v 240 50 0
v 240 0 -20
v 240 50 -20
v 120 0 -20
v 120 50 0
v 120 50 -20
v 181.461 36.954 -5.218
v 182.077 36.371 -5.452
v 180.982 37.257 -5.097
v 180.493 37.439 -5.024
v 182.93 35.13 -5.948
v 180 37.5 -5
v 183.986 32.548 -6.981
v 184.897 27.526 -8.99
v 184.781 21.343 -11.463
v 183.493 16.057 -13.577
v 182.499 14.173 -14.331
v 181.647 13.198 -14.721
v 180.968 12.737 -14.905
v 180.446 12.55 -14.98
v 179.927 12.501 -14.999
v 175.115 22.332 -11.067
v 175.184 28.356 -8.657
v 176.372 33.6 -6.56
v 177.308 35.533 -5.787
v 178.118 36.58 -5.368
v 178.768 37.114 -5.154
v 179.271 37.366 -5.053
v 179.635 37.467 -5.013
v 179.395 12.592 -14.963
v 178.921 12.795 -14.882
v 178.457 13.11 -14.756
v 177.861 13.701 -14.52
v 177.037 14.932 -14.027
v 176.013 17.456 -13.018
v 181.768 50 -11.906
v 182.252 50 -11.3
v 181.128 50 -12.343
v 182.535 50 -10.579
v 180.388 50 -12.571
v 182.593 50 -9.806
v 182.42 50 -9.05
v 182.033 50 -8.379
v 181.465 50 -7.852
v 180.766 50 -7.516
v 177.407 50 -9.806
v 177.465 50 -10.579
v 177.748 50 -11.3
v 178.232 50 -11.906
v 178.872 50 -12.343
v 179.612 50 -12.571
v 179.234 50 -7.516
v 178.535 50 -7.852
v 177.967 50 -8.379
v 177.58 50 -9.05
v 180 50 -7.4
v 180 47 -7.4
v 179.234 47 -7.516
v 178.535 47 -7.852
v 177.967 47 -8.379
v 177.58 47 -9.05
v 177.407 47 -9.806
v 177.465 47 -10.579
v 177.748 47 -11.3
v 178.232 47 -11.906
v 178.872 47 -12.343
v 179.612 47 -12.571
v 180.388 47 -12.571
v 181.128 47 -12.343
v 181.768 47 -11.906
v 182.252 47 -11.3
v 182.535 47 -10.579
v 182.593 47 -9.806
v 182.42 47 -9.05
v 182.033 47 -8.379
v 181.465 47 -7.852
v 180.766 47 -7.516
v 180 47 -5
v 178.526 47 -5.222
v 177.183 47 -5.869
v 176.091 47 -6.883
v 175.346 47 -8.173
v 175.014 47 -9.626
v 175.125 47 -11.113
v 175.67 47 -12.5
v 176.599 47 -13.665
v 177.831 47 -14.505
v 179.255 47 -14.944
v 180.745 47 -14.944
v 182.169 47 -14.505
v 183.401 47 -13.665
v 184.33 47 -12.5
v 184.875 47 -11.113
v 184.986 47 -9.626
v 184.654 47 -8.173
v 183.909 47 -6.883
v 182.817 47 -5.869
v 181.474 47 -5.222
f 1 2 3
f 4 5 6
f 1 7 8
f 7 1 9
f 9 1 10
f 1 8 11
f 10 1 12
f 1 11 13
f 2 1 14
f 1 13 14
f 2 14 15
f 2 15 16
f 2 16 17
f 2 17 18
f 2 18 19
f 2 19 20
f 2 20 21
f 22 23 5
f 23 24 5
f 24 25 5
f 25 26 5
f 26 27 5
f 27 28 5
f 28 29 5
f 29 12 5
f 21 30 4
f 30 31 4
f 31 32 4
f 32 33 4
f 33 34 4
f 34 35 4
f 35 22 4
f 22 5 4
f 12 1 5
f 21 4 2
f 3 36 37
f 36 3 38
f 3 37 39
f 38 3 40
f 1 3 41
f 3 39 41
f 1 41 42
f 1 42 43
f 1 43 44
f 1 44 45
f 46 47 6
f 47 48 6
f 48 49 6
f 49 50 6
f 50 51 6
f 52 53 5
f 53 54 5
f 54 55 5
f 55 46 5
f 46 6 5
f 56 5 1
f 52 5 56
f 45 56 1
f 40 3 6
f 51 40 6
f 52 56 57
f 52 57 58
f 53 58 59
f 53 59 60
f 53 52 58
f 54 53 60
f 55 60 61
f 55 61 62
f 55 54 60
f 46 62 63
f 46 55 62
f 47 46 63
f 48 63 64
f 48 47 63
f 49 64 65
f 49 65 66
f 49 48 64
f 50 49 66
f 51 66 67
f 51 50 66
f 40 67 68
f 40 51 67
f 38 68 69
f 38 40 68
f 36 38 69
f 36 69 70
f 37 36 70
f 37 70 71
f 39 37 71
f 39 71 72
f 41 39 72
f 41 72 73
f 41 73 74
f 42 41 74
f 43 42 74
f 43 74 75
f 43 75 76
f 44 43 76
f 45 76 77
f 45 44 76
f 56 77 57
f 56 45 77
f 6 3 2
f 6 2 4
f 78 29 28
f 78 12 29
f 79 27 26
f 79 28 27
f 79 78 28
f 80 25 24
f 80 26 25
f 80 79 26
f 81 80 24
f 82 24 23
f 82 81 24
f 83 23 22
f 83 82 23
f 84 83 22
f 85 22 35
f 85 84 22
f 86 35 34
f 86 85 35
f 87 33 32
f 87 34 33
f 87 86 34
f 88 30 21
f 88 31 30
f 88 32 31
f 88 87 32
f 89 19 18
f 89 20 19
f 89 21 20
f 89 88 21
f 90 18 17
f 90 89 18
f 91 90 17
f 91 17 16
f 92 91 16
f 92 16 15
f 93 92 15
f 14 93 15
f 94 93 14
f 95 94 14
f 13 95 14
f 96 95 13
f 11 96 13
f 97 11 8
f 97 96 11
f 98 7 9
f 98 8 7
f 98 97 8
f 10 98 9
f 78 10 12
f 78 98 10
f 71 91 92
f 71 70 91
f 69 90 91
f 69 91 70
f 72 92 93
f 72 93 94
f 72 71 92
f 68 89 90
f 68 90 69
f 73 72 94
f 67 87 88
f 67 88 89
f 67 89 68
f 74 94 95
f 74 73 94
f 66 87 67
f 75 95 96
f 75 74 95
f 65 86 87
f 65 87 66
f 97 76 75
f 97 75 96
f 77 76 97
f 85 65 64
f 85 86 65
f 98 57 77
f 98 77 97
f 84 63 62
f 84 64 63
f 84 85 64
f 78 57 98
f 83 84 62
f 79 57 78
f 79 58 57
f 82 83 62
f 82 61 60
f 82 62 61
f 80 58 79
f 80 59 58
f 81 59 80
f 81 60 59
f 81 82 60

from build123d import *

# Parameters (mm, degrees)
SKETCH_1_W          = 120
SKETCH_1_H          = 20
EXTRUDE_1_DEPTH     = 50
SKETCH_2_W          = 6
SKETCH_2_H          = 20
EXTRUDE_2_DEPTH     = 20
CUT_EXTRUDE_1_DEPTH = 114
SKETCH_4_R          = 2.6
SKETCH_4_W          = 20
SKETCH_4_H          = 20
CUT_EXTRUDE_2_DEPTH = 114
SKETCH_5_R          = 5
CUT_EXTRUDE_3_DEPTH = 3
SKETCH_6_R          = 2.6
CUT_EXTRUDE_4_DEPTH = 300
SKETCH_8_R          = 5
CUT_EXTRUDE_5_DEPTH = 300
SKETCH_9_R          = 5
SKETCH_9_R_2        = 2.6
EXTRUDE_3_DEPTH     = 3
SKETCH_11_W         = 120
SKETCH_11_H         = 20
CUT_EXTRUDE_6_DEPTH = 100
CUT_EXTRUDE_7_DEPTH = 10


with BuildPart() as part:
    # 草图1 → 凸台-拉伸1 (new body)
    with BuildSketch(Plane(origin=(0, 0, 0), x_dir=(1, 0, 0), z_dir=(0, 1, 0))):
        with Locations((60, 10)):
            Rectangle(SKETCH_1_W, SKETCH_1_H)
    extrude_1 = extrude(amount=EXTRUDE_1_DEPTH)

    # 草图2 → 凸台-拉伸2 (add)
    with BuildSketch(Plane.XY):
        with Locations((3, -10)):
            Rectangle(SKETCH_2_W, SKETCH_2_H)
    extrude_2 = extrude(amount=-EXTRUDE_2_DEPTH)

    # 草图3 → 切除-拉伸1 (cut)
    with BuildSketch(Plane(origin=(120, 0, 0), x_dir=(0, 0, -1), z_dir=(1, 0, 0))):
        Polygon((0, 50), (20, 0), (0, 0), align=None)
    cut_extrude_1 = extrude(amount=-CUT_EXTRUDE_1_DEPTH, mode=Mode.SUBTRACT)

    # 草图4 → 切除-拉伸2 (cut)
    with BuildSketch(Plane(origin=(6, 0, 0), x_dir=(0, 0, -1), z_dir=(1, 0, 0))):
        with Locations((10, 10)):
            Circle(SKETCH_4_R)
        with Locations((10, -10)):
            Rectangle(SKETCH_4_W, SKETCH_4_H)
    cut_extrude_2 = extrude(amount=-CUT_EXTRUDE_2_DEPTH, mode=Mode.SUBTRACT)

    # 草图5 → 切除-拉伸3 (cut)
    with BuildSketch(Plane(origin=(6, 0, 0), x_dir=(0, 0, -1), z_dir=(1, 0, 0))):
        with Locations((10, 10)):
            Circle(SKETCH_5_R)
    cut_extrude_3 = extrude(amount=-CUT_EXTRUDE_3_DEPTH, mode=Mode.SUBTRACT)

    # 草图6 → 切除-拉伸4 (cut)
    with BuildSketch(Plane(origin=(0, 50, 0), x_dir=(1, 0, 0), z_dir=(0, 1, 0))):
        with Locations((60, 10)):
            Circle(SKETCH_6_R)
    extrude(amount=-CUT_EXTRUDE_4_DEPTH, mode=Mode.SUBTRACT)

    # 草图8 → 切除-拉伸5 (cut)
    with BuildSketch(Plane(origin=(0, 50, 0), x_dir=(1, 0, 0), z_dir=(0, 1, 0))):
        with Locations((60, 10)):
            Circle(SKETCH_8_R)
    cut_extrude_5 = extrude(amount=-CUT_EXTRUDE_5_DEPTH, mode=Mode.SUBTRACT)

    # 草图9 → 凸台-拉伸3 (add)
    with BuildSketch(Plane(origin=(0, 50, 0), x_dir=(1, 0, 0), z_dir=(0, 1, 0))):
        with Locations((60, 10)):
            Circle(SKETCH_9_R)
        with Locations((60, 10)):
            Circle(SKETCH_9_R_2, mode=Mode.SUBTRACT)
    extrude_3 = extrude(amount=-EXTRUDE_3_DEPTH)

    # 镜向2: 凸台-拉伸1, 凸台-拉伸2, 切除-拉伸1, 切除-拉伸2, 切除-拉伸3, 切除-拉伸5, 凸台-拉伸3 across plane
    add(extrude_1.mirror(Plane(origin=(120, 50, 0), x_dir=(0, 0, 1), z_dir=(-1, 0, 0))))
    add(extrude_2.mirror(Plane(origin=(120, 50, 0), x_dir=(0, 0, 1), z_dir=(-1, 0, 0))))
    add(cut_extrude_1.mirror(Plane(origin=(120, 50, 0), x_dir=(0, 0, 1), z_dir=(-1, 0, 0))), mode=Mode.SUBTRACT)
    add(cut_extrude_2.mirror(Plane(origin=(120, 50, 0), x_dir=(0, 0, 1), z_dir=(-1, 0, 0))), mode=Mode.SUBTRACT)
    add(cut_extrude_3.mirror(Plane(origin=(120, 50, 0), x_dir=(0, 0, 1), z_dir=(-1, 0, 0))), mode=Mode.SUBTRACT)
    add(cut_extrude_5.mirror(Plane(origin=(120, 50, 0), x_dir=(0, 0, 1), z_dir=(-1, 0, 0))), mode=Mode.SUBTRACT)
    add(extrude_3.mirror(Plane(origin=(120, 50, 0), x_dir=(0, 0, 1), z_dir=(-1, 0, 0))))

    # 草图11 → 切除-拉伸6 (cut)
    with BuildSketch(Plane(origin=(0, 50, 0), x_dir=(1, 0, 0), z_dir=(0, 1, 0))):
        with Locations((60, 10)):
            Rectangle(SKETCH_11_W, SKETCH_11_H)
    extrude(amount=-CUT_EXTRUDE_6_DEPTH, mode=Mode.SUBTRACT)

    # 草图12 → 切除-拉伸7 (cut)
    with BuildSketch(Plane.ZY.offset(-234)):
        Polygon((-20, 0), (0, 0), (0, 50), align=None)
    extrude(amount=-CUT_EXTRUDE_7_DEPTH, mode=Mode.SUBTRACT)


solid = part.part
